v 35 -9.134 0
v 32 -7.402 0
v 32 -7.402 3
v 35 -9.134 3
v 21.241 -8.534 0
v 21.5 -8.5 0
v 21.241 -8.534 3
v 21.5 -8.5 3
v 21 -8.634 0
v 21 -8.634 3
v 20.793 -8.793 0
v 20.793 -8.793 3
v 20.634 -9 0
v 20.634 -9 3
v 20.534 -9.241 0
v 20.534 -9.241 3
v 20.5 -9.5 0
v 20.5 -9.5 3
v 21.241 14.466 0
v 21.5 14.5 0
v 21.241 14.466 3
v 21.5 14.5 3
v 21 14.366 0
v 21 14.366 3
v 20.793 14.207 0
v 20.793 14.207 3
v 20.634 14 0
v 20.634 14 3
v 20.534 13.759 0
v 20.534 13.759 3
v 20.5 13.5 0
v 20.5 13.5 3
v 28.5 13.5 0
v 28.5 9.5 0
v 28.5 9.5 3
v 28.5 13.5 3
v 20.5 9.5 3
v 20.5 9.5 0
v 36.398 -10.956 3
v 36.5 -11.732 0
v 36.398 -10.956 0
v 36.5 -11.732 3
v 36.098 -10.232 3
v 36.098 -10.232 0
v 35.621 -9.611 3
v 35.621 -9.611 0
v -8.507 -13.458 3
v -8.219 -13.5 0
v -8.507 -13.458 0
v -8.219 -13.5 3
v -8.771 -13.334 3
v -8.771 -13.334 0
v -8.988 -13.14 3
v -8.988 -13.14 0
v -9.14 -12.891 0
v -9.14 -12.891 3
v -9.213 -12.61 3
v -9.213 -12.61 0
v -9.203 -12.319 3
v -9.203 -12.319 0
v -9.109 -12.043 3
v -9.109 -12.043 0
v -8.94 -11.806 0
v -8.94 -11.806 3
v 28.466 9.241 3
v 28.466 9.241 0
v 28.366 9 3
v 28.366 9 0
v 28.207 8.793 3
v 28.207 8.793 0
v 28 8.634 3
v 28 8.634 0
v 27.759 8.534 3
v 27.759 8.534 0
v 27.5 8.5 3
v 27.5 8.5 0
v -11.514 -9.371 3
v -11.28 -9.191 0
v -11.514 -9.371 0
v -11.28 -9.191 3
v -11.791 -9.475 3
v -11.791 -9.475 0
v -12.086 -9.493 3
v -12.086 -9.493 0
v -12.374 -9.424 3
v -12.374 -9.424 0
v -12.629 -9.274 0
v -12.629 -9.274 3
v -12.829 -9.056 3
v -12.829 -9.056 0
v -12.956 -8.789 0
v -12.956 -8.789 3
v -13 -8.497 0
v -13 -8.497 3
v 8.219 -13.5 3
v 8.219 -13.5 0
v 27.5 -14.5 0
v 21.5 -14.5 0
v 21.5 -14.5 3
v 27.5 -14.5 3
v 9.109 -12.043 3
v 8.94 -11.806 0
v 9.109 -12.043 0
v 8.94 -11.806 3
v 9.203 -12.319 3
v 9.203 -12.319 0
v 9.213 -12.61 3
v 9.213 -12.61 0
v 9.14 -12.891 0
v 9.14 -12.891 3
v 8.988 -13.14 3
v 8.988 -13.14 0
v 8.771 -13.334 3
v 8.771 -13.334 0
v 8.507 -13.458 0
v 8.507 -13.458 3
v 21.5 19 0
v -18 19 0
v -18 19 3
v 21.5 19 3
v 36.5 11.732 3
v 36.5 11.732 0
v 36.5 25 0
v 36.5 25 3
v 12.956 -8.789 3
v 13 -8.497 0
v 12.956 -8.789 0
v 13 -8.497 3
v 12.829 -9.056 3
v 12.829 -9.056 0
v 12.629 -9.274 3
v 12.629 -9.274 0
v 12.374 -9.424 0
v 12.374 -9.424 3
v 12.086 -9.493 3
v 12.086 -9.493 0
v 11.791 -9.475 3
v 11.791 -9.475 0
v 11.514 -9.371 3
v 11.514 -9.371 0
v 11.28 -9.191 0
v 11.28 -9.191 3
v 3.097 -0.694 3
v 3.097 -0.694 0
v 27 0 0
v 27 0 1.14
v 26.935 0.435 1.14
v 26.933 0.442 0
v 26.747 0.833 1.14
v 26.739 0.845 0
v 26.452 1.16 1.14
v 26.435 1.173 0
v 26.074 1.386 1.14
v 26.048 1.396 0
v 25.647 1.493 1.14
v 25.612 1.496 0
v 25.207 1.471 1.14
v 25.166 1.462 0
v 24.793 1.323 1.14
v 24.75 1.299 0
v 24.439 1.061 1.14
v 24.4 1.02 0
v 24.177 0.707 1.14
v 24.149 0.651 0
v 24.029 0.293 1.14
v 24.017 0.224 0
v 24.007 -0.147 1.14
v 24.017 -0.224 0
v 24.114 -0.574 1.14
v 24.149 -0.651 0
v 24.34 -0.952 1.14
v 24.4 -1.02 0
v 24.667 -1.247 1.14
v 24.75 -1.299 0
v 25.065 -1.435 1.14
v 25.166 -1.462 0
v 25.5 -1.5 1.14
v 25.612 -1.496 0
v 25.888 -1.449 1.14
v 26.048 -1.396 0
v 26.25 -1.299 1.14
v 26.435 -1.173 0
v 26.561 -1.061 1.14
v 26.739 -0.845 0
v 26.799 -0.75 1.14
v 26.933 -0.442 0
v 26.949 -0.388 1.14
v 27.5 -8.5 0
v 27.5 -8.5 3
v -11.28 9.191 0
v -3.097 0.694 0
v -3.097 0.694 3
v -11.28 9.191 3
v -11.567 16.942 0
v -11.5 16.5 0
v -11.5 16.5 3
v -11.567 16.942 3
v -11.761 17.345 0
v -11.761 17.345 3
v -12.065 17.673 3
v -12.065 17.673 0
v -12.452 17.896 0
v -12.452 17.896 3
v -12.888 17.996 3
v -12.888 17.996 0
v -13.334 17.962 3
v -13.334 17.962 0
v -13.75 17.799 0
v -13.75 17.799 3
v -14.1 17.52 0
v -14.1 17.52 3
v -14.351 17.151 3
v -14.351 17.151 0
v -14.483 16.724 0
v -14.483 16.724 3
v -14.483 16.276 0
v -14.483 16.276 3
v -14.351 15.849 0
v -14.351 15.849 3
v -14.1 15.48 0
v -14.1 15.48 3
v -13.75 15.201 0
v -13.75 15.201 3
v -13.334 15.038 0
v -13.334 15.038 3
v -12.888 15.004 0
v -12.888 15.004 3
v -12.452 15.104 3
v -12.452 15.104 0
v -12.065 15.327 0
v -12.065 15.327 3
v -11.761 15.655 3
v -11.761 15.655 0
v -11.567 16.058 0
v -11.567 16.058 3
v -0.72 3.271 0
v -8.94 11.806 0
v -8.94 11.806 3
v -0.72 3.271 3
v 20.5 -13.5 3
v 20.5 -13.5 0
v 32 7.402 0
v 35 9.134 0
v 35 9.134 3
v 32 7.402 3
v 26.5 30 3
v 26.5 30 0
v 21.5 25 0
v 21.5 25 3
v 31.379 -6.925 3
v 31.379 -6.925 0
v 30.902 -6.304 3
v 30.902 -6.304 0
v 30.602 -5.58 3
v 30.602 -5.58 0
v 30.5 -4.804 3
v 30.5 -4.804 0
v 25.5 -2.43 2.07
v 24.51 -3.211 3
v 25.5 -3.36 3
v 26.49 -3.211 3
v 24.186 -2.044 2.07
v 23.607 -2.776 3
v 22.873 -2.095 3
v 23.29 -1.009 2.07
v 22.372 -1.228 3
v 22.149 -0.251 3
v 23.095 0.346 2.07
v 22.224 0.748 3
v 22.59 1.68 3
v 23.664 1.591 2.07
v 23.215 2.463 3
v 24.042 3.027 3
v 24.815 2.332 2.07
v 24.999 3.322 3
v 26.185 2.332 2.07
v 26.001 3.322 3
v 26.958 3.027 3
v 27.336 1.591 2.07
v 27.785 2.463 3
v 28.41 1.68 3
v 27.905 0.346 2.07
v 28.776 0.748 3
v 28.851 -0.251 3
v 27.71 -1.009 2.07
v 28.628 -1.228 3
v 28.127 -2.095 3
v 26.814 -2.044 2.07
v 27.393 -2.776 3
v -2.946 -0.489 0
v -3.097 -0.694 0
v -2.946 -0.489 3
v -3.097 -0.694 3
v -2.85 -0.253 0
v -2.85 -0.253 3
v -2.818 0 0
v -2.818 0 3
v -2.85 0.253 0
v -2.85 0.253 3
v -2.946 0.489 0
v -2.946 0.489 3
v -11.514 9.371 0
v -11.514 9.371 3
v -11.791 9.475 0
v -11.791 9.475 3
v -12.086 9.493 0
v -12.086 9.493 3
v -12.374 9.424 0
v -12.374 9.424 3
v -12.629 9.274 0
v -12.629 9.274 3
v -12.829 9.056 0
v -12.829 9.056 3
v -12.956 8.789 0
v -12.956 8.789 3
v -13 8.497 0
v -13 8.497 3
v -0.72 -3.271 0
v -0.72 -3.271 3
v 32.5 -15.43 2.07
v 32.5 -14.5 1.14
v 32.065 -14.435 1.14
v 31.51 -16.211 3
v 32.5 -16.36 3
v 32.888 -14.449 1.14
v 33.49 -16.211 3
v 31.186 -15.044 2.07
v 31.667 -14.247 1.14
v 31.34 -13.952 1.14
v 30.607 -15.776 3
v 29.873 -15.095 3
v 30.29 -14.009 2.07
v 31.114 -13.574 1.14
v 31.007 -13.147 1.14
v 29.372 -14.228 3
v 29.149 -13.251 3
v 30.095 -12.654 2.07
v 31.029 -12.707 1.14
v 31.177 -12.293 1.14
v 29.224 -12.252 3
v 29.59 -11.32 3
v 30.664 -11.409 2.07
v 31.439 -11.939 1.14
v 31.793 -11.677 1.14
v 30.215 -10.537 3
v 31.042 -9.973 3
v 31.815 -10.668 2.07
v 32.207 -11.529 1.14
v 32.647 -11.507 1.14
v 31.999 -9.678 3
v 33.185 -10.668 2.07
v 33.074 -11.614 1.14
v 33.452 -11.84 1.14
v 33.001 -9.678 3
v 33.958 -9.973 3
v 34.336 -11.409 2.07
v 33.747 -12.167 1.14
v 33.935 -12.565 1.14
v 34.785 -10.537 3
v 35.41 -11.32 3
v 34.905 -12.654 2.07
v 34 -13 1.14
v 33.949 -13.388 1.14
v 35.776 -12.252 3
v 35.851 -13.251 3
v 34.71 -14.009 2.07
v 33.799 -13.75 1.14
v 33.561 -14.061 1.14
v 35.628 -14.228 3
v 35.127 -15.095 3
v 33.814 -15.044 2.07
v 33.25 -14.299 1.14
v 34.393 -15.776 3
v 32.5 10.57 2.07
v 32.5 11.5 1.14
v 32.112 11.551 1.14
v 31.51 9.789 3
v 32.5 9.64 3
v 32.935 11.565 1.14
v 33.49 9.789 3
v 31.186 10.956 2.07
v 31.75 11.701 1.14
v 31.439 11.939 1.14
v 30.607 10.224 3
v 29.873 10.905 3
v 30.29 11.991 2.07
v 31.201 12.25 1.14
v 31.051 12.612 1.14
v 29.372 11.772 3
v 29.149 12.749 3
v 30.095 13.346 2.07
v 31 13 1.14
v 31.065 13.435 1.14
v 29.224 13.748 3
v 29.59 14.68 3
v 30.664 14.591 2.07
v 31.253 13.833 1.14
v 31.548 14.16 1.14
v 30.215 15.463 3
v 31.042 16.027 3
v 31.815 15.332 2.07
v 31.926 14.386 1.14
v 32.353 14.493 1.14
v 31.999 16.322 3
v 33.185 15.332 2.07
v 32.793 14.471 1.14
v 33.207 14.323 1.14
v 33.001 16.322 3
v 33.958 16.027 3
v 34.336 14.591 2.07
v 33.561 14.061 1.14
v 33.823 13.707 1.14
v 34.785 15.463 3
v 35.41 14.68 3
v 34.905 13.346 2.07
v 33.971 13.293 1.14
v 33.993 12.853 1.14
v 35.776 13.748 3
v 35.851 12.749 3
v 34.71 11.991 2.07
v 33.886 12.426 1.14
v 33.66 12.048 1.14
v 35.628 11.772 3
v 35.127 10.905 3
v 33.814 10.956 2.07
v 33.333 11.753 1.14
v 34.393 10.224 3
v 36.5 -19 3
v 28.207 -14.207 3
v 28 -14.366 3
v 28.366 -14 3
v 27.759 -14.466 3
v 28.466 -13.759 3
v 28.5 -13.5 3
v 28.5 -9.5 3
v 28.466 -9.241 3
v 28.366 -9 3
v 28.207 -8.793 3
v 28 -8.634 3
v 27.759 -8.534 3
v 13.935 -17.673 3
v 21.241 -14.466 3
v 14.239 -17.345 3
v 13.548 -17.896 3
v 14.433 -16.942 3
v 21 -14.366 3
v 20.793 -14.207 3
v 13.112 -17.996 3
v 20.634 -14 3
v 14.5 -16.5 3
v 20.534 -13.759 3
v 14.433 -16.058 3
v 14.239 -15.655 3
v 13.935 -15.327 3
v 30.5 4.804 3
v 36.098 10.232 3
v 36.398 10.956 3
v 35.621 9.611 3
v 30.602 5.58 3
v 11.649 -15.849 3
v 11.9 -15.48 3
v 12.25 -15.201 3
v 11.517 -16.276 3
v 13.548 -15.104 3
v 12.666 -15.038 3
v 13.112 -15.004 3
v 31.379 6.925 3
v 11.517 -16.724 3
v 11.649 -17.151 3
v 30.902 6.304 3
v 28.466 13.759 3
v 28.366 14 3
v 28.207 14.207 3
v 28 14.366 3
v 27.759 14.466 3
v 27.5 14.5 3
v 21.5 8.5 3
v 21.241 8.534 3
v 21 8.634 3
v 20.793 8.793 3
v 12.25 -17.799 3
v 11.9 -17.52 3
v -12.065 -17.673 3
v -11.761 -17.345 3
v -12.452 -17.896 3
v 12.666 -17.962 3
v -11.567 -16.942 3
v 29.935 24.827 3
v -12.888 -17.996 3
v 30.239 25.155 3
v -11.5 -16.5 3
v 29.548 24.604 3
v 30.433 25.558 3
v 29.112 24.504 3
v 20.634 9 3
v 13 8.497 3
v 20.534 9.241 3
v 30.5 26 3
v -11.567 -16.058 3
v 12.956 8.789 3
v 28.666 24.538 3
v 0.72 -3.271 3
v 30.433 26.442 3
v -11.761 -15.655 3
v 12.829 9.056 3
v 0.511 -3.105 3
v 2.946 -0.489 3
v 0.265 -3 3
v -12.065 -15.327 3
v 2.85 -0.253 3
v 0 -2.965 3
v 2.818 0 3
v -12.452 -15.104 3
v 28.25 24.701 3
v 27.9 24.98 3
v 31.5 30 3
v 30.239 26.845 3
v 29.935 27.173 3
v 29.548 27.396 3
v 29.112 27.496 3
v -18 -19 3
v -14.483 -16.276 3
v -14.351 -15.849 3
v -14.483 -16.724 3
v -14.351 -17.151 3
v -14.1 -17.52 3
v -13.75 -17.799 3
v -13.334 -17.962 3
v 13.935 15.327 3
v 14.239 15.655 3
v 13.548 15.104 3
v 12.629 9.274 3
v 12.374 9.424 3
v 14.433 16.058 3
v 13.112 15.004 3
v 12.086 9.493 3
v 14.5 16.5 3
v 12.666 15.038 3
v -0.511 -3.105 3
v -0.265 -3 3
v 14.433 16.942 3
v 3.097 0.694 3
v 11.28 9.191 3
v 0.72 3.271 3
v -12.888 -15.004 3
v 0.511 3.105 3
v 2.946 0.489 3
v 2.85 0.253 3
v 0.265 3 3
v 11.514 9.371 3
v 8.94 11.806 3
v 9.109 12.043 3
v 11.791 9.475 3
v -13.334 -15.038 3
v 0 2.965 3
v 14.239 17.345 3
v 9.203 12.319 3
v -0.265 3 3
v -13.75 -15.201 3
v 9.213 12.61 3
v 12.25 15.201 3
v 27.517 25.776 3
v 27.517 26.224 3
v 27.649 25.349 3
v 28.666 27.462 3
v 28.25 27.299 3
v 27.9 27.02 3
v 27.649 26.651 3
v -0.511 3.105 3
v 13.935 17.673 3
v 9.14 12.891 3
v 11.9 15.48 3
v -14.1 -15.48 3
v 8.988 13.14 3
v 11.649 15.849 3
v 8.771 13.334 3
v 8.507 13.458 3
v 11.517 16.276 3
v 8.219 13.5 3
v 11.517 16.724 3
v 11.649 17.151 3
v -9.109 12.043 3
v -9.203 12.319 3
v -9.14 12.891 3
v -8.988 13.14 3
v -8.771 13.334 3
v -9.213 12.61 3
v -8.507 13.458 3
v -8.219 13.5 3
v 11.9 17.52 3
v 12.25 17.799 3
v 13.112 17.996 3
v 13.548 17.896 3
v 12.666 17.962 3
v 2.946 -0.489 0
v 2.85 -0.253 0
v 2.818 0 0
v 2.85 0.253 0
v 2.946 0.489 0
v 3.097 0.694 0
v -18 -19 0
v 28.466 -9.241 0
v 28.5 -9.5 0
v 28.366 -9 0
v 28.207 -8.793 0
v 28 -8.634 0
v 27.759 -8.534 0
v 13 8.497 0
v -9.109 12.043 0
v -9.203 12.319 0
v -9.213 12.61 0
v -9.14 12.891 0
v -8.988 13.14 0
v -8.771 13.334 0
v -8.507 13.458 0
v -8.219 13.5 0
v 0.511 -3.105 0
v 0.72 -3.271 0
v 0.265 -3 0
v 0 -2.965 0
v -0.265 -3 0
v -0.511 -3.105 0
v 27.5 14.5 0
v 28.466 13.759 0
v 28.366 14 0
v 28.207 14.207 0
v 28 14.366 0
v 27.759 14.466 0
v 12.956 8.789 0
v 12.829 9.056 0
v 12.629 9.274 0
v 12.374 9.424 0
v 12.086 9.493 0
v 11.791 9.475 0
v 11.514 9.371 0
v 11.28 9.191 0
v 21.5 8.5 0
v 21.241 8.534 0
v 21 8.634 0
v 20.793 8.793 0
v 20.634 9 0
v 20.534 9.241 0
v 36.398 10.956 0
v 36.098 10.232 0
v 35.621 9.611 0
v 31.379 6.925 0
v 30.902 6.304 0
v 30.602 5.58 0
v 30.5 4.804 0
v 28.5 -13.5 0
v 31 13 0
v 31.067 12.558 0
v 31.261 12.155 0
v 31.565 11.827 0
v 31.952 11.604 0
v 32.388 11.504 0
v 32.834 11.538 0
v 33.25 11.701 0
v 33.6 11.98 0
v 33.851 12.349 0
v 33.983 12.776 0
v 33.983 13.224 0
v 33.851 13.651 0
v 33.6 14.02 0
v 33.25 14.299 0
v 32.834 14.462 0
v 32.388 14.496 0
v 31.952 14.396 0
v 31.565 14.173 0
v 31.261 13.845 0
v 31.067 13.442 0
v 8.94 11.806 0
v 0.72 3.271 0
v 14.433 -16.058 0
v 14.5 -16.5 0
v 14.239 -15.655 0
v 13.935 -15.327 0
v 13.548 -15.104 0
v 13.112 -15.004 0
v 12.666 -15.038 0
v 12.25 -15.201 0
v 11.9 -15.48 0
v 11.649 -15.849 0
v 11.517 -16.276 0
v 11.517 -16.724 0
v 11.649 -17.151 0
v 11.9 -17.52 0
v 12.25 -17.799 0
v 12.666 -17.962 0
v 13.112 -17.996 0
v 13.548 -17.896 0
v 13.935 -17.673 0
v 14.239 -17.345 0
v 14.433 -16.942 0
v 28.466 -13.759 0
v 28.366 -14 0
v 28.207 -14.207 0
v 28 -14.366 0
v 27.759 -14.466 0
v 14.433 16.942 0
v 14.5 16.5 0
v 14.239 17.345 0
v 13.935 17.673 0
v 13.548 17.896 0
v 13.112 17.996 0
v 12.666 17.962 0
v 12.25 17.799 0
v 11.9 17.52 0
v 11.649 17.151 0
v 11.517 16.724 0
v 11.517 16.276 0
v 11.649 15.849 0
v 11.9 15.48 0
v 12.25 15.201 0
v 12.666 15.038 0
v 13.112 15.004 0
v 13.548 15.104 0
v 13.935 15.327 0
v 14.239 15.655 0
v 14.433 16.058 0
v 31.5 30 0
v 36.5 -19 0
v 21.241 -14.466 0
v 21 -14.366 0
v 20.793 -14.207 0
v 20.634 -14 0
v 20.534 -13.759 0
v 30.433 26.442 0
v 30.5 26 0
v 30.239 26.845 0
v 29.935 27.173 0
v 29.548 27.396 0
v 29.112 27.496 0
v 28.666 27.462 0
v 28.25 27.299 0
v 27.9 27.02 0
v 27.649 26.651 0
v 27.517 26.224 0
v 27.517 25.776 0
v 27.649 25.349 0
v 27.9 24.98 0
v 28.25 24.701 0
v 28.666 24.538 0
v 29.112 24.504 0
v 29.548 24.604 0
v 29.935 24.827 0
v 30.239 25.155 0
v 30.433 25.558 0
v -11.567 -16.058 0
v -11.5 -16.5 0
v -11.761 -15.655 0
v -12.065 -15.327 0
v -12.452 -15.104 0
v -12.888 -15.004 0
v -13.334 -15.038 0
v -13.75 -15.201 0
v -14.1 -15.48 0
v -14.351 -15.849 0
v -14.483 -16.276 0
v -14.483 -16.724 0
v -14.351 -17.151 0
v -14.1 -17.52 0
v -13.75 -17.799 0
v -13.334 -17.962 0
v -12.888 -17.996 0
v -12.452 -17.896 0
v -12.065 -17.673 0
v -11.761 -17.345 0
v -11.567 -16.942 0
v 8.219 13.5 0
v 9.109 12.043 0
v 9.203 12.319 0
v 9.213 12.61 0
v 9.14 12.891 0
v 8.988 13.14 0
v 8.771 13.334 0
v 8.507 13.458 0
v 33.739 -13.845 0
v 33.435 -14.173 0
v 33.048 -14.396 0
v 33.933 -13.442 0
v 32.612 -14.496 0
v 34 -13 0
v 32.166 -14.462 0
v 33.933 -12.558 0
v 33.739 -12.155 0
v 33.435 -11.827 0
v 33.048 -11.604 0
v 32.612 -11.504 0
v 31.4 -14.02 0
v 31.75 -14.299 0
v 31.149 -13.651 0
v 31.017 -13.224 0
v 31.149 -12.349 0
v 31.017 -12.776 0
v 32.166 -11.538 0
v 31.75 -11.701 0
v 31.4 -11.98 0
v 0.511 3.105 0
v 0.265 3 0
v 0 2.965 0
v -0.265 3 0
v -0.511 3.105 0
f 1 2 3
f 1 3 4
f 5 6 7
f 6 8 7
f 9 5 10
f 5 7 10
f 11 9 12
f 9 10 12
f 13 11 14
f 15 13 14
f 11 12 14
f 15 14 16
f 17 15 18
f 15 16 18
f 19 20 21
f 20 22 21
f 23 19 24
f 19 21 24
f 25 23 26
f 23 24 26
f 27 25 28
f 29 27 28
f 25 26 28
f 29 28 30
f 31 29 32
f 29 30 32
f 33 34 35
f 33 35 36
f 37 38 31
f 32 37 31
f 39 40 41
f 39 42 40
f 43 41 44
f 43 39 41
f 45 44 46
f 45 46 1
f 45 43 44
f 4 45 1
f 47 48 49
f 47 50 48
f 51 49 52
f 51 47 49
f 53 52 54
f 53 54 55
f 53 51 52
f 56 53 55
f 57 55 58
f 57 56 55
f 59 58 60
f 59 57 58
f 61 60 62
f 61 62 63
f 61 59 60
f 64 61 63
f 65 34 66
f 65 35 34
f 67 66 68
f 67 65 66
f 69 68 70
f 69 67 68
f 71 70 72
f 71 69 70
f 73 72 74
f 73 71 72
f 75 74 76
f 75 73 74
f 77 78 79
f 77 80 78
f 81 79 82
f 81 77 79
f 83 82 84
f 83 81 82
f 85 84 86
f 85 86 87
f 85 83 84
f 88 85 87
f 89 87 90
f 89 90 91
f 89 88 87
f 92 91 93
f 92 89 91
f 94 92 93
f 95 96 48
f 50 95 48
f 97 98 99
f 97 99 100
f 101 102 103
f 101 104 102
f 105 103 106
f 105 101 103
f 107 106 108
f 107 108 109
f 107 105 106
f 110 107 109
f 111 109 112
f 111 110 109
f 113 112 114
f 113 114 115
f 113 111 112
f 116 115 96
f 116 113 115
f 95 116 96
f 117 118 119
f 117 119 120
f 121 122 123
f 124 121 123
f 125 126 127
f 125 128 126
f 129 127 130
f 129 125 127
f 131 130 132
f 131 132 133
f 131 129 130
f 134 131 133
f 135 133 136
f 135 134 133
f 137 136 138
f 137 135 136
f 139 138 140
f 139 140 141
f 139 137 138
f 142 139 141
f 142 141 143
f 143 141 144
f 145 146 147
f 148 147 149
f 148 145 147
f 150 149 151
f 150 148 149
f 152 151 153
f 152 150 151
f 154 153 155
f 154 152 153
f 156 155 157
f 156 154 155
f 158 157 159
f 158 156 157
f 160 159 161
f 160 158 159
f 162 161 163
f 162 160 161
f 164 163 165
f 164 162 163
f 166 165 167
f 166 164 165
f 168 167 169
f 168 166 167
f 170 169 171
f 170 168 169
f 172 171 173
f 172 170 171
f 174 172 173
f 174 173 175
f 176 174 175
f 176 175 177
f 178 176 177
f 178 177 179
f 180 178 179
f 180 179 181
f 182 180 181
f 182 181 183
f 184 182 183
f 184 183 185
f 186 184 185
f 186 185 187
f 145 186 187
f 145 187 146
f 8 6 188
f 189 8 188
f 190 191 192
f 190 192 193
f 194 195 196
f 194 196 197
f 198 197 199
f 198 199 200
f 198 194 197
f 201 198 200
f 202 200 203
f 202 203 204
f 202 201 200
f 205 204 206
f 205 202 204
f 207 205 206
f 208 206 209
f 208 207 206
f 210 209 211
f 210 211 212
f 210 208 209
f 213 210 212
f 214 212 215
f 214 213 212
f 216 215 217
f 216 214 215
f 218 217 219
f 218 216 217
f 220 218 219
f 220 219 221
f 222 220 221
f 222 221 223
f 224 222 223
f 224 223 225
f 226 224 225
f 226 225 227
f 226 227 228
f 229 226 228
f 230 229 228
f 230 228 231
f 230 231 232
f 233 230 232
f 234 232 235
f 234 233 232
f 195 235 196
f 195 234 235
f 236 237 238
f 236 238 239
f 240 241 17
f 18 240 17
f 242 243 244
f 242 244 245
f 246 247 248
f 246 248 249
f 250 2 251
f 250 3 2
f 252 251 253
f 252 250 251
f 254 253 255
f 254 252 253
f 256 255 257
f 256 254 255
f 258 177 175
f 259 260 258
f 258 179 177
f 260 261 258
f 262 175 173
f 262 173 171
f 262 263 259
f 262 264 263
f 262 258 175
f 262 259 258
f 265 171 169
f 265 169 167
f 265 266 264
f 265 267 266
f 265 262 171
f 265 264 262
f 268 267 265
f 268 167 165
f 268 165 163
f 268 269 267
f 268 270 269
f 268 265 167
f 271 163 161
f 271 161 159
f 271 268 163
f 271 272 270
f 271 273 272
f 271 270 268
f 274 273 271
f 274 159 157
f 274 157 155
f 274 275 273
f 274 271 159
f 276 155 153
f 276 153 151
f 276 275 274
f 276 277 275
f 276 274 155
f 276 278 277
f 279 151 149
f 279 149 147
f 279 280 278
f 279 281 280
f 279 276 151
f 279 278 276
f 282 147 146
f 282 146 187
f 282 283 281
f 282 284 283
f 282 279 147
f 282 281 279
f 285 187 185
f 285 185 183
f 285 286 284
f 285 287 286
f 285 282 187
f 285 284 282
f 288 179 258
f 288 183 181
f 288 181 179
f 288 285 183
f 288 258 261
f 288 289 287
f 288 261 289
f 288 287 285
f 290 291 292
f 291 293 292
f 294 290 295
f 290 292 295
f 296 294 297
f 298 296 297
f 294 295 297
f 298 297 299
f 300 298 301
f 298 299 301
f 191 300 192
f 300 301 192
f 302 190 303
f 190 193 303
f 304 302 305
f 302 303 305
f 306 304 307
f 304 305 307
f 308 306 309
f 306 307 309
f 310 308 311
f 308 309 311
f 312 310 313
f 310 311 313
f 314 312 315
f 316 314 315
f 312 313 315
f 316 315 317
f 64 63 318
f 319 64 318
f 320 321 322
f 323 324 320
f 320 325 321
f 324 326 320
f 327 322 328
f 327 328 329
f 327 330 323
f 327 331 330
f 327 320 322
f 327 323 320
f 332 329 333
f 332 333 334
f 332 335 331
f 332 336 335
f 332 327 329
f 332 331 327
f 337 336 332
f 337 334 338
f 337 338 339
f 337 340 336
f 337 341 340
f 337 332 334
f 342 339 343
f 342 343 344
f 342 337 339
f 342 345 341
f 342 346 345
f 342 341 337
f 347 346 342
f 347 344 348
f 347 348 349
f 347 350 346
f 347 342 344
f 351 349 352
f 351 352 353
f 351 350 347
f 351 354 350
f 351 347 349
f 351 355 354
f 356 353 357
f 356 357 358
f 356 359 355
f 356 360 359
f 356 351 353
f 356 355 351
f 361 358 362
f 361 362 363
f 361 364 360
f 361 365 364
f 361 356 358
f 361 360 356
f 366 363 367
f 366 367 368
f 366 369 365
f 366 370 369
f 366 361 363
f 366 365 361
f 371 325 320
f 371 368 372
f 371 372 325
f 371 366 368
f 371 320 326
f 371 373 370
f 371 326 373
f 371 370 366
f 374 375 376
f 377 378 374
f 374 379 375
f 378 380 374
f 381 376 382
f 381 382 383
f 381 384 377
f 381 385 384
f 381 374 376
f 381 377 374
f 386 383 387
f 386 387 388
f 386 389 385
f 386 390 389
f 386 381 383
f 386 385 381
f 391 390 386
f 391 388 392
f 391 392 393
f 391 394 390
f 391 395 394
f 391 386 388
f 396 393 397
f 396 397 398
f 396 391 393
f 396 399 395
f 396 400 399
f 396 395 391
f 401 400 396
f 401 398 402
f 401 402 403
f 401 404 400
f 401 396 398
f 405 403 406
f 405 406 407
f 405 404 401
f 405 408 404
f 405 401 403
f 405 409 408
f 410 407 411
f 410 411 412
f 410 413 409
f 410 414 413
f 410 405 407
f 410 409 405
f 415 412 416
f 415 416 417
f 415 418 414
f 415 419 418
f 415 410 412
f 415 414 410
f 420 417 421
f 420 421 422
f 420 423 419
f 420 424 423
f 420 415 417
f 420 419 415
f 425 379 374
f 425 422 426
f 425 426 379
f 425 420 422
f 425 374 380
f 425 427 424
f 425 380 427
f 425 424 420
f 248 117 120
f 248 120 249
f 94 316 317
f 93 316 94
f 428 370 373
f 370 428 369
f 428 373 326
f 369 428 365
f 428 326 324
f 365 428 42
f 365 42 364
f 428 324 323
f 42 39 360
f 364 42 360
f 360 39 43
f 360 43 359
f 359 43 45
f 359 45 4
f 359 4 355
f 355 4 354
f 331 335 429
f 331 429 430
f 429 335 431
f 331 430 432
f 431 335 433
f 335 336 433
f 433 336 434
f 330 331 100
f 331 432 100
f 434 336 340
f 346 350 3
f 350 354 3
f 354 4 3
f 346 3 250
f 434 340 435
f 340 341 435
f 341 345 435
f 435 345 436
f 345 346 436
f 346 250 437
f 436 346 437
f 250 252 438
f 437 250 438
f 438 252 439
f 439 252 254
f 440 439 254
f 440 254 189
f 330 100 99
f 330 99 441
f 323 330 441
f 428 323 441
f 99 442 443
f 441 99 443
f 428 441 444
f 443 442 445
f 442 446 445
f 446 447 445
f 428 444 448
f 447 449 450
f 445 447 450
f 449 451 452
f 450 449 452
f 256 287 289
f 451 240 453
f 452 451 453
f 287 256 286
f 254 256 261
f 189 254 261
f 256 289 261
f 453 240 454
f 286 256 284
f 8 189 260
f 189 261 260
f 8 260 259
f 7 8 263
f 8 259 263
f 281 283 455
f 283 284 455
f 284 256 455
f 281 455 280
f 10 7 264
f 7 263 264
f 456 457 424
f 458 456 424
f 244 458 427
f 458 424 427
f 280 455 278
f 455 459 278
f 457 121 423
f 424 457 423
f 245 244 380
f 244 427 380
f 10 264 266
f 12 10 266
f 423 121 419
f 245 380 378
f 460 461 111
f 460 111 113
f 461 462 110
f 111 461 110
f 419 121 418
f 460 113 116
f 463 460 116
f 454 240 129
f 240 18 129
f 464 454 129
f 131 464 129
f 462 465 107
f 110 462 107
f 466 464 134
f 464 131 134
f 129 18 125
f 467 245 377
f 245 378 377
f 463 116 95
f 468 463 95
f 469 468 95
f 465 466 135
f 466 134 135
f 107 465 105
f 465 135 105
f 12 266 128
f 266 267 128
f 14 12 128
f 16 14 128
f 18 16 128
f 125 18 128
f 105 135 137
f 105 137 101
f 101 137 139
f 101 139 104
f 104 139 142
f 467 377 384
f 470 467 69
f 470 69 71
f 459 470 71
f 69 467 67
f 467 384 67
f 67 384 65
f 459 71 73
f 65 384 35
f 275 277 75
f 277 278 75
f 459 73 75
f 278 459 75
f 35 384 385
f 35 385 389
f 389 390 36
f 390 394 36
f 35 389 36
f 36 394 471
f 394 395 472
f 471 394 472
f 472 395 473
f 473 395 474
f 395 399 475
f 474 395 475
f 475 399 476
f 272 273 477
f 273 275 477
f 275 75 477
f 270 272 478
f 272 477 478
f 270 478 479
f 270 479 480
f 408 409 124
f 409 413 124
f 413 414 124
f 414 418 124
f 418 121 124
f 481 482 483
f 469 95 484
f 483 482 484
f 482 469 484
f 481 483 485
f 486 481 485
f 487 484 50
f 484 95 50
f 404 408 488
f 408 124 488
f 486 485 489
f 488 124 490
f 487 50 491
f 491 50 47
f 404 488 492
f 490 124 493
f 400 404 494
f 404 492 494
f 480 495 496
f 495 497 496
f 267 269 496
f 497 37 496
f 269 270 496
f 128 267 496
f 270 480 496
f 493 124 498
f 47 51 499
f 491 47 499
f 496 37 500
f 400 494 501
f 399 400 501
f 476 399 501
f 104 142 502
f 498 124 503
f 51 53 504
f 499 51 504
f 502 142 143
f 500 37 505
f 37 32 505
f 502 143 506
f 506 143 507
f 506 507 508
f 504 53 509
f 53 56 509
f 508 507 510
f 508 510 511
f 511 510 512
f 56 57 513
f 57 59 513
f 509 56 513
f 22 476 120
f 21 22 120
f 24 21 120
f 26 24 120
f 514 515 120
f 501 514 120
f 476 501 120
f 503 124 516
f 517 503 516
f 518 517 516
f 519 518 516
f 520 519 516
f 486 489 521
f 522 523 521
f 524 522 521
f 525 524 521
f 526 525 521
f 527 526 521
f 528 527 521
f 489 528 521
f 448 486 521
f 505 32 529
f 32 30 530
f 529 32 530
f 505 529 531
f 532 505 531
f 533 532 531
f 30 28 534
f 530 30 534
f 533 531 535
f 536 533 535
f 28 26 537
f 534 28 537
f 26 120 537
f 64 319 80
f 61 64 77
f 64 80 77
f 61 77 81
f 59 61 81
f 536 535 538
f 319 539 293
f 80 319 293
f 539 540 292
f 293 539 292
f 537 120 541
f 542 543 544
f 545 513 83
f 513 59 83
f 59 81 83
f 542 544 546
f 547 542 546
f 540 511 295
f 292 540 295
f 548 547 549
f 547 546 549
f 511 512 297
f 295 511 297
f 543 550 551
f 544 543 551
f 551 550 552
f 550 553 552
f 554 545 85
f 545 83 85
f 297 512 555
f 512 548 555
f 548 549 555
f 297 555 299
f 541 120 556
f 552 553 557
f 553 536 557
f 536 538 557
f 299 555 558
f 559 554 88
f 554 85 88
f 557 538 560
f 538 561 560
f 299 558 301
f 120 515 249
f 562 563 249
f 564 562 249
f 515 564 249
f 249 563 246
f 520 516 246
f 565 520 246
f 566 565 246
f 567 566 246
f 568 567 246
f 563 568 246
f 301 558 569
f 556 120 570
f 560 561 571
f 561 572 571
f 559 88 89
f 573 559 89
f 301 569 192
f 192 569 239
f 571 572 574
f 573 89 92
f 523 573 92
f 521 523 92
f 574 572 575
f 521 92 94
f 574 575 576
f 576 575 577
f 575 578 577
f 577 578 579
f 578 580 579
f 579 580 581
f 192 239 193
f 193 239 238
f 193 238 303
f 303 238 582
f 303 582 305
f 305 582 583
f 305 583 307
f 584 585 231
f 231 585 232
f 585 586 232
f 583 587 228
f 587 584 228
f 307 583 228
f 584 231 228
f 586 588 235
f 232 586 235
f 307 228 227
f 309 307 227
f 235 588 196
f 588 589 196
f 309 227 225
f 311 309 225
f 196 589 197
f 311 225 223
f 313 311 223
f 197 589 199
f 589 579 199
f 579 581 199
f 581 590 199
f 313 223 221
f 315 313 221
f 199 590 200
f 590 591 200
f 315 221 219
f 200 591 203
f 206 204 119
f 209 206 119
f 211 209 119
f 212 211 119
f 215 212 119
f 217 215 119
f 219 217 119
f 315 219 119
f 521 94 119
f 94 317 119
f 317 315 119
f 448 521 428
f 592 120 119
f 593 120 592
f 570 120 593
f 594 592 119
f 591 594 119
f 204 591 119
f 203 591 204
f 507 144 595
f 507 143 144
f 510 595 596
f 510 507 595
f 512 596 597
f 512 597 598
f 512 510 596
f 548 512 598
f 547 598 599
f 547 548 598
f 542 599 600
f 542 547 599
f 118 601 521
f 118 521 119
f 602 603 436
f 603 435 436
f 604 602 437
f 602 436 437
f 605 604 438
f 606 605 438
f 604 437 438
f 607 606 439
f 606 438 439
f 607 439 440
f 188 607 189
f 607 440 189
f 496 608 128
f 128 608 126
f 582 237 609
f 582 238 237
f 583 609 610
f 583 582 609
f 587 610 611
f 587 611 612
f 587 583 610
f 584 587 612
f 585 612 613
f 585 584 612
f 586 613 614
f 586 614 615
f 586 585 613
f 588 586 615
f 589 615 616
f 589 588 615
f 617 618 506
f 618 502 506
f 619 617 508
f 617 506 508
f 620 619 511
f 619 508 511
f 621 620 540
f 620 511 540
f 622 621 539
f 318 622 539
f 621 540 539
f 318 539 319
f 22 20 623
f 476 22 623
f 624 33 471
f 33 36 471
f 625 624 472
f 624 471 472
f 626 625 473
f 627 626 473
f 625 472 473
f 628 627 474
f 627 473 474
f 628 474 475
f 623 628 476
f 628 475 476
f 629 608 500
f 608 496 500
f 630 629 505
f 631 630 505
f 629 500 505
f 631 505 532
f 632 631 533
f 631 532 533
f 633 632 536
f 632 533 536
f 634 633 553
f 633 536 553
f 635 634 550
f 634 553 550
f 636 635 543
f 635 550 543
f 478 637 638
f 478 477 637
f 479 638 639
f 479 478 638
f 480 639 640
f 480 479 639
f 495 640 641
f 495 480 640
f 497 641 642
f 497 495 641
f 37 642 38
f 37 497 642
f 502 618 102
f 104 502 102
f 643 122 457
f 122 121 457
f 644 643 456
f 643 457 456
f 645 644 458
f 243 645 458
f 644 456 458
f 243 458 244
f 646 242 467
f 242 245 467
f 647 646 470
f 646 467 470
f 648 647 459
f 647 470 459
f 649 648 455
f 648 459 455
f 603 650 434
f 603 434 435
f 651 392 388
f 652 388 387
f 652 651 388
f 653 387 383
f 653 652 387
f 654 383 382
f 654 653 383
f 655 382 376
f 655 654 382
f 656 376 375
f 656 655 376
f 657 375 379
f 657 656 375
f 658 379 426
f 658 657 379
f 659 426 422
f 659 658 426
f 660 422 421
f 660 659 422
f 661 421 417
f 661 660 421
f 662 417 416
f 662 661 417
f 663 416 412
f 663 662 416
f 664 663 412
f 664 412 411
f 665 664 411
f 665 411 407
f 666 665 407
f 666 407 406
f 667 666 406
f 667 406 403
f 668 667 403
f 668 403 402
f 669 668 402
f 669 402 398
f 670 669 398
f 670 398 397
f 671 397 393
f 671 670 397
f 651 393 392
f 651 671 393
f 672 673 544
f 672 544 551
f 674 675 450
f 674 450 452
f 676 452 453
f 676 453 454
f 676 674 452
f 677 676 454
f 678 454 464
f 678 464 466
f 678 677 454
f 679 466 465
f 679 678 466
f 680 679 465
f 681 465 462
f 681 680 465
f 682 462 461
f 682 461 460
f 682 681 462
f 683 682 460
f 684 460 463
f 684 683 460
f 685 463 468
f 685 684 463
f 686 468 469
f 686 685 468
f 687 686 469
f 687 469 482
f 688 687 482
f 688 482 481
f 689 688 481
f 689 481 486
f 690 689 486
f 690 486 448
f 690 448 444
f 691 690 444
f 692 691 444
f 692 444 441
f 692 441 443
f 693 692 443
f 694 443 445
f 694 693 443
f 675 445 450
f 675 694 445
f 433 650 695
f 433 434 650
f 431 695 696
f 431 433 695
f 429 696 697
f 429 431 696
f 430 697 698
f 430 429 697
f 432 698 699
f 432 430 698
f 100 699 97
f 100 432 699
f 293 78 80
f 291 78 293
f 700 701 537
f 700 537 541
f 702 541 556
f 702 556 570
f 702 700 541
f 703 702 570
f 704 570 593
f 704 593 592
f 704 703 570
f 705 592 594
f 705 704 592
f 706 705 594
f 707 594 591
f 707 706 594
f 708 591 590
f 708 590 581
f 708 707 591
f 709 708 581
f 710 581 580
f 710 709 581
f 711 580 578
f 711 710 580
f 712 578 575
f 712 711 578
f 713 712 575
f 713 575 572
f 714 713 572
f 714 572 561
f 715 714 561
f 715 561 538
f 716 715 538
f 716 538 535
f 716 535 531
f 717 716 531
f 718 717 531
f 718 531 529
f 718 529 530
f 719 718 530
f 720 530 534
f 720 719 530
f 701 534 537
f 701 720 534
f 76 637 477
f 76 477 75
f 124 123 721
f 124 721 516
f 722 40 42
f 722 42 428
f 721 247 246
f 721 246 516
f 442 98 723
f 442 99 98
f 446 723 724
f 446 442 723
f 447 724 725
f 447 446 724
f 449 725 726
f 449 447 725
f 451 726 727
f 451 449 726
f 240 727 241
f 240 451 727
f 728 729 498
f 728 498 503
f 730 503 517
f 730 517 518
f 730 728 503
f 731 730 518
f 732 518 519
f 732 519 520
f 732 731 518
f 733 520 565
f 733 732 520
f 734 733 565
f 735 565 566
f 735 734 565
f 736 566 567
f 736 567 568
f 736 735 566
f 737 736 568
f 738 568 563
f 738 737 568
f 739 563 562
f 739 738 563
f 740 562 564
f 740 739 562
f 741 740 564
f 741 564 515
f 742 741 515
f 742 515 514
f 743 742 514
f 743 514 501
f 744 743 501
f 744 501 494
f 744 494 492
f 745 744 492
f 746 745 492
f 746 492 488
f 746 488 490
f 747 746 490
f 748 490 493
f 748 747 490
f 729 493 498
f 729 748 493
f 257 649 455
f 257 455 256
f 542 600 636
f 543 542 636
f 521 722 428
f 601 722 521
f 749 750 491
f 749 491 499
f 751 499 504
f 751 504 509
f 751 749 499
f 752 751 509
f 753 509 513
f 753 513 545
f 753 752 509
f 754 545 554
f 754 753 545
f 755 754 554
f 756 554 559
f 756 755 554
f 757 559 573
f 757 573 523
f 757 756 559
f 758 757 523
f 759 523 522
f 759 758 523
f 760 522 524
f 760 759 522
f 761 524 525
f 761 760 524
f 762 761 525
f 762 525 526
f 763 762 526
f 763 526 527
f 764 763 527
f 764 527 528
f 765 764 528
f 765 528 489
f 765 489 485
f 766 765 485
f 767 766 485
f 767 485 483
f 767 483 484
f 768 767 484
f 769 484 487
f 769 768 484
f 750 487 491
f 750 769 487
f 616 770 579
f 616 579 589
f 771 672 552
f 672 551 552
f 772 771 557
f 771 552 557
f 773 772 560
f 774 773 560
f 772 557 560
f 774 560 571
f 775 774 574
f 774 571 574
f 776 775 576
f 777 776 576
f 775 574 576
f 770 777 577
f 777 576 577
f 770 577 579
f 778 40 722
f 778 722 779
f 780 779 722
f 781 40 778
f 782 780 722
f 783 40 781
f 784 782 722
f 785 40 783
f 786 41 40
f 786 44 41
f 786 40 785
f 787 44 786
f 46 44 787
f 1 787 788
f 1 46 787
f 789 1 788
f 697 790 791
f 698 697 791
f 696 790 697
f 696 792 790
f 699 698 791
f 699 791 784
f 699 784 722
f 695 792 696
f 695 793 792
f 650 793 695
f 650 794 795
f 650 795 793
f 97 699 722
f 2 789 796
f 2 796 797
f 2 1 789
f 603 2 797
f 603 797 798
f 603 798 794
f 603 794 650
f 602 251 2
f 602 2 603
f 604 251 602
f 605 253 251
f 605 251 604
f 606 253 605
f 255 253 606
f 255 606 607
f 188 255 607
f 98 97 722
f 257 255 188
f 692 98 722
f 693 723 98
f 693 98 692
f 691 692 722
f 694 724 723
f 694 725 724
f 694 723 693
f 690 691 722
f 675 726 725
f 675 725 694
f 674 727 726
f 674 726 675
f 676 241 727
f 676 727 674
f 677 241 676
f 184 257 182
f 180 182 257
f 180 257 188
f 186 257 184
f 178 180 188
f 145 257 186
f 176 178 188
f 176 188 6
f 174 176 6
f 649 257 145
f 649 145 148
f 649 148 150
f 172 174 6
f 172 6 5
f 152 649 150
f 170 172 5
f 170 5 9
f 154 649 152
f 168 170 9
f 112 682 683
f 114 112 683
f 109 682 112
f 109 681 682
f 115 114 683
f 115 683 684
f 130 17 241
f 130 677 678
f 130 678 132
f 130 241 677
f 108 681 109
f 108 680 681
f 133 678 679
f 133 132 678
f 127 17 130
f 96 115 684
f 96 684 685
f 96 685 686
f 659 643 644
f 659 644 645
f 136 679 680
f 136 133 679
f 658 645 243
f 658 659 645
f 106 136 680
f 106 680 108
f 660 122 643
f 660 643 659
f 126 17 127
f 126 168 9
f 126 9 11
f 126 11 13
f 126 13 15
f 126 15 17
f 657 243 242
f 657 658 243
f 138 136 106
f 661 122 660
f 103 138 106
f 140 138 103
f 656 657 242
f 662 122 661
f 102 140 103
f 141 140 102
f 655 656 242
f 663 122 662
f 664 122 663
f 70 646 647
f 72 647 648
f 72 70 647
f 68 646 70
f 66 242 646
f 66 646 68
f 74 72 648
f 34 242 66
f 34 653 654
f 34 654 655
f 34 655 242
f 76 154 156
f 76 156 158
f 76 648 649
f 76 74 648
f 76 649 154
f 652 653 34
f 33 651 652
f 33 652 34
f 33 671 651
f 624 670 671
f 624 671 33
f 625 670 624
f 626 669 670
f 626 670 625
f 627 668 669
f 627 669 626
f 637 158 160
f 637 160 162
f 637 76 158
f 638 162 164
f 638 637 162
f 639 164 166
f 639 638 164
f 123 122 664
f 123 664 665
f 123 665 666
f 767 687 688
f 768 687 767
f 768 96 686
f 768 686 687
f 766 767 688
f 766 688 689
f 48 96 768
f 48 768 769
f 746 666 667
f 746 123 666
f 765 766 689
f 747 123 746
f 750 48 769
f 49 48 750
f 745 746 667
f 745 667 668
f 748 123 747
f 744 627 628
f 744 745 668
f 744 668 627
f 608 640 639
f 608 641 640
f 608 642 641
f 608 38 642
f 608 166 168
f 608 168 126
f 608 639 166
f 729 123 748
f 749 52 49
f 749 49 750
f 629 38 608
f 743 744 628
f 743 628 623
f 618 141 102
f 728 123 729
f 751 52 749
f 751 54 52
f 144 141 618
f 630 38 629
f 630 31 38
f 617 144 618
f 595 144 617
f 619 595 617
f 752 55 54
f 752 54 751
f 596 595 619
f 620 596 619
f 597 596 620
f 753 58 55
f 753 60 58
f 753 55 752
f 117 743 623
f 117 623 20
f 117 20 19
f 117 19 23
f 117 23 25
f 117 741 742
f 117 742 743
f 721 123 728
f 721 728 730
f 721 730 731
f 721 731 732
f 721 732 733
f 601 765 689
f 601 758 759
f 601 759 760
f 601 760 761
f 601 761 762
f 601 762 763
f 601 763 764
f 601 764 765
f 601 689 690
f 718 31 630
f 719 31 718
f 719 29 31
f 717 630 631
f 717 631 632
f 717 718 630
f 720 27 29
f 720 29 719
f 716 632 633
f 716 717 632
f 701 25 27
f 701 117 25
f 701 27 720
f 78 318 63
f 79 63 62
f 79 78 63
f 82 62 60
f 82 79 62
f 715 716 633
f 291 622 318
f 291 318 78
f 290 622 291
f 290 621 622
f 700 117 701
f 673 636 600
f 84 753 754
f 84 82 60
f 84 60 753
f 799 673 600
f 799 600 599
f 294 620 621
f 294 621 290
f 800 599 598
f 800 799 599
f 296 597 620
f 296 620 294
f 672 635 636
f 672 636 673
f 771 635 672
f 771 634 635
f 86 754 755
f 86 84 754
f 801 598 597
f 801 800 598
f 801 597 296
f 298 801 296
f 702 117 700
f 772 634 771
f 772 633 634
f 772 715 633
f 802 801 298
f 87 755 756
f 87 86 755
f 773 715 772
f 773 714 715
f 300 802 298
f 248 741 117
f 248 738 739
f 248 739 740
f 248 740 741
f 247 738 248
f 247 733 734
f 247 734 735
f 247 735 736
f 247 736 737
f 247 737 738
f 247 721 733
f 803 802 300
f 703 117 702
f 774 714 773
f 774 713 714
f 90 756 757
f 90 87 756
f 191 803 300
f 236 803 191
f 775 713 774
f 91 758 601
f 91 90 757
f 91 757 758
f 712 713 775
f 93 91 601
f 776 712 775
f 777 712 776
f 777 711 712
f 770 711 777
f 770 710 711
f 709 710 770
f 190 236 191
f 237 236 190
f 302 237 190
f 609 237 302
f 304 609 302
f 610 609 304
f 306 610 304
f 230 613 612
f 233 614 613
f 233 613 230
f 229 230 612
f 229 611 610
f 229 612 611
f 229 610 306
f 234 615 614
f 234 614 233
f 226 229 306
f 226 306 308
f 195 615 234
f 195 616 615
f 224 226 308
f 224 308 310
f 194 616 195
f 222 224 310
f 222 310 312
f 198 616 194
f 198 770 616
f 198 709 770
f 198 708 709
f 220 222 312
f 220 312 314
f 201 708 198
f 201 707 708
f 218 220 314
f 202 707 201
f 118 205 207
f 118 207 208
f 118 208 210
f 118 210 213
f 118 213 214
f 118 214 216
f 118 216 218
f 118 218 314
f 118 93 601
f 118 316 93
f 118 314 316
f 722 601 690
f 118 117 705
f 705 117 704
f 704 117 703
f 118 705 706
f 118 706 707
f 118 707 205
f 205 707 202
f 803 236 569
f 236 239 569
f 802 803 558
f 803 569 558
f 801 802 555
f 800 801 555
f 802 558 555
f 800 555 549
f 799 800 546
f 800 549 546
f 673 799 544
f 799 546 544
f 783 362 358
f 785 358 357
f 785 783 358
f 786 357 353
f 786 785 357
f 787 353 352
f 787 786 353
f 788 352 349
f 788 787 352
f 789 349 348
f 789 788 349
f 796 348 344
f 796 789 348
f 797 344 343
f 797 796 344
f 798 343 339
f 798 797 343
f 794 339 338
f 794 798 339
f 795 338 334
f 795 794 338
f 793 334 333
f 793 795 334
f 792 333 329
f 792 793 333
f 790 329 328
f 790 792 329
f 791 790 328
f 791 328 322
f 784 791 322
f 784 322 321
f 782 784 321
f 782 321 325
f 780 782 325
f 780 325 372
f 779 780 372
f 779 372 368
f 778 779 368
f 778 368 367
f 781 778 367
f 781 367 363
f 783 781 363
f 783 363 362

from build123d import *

# Parameters (mm, degrees)
SKETCH_1_R                  = 1.5
SKETCH_1_W                  = 8
SKETCH_1_H                  = 6
EXTRUDE_1_DEPTH             = 3
HOLE_WIZARD_M3_1_AT_2_COUNT = 2
HOLE_WIZARD_M3_1_AT_2_PITCH = 14.76482306
HOLE_WIZARD_M3_1_AT_3_COUNT = 2
HOLE_WIZARD_M3_1_AT_3_PITCH = 26
FILLET_1_R                  = 1
CHAMFER_1_SIZE              = 5
FILLET_2_R                  = 3


with BuildPart() as part:
    # 草图1 → 凸台-拉伸1 (new body)
    with BuildSketch(Plane.XY):
        Polygon((36.5, -19), (-18, -19), (-18, 19), (21.5, 19), (21.5, 30), (36.5, 30), (36.5, 19), (36.5, 10), (30.5, 6.535898385), (30.5, -6.535898385), (36.5, -10), align=None)
        with Locations((-13, 16.5)):
            Circle(SKETCH_1_R, mode=Mode.SUBTRACT)
        with Locations((-13, -16.5)):
            Circle(SKETCH_1_R, mode=Mode.SUBTRACT)
        with Locations((13, -16.5)):
            Circle(SKETCH_1_R, mode=Mode.SUBTRACT)
        with Locations((13, 16.5)):
            Circle(SKETCH_1_R, mode=Mode.SUBTRACT)
        with Locations((32.5, -13)):
            Circle(SKETCH_1_R, mode=Mode.SUBTRACT)
        with Locations(Location((32.5, 13, 0), (0, 0, 180))):
            Circle(SKETCH_1_R, mode=Mode.SUBTRACT)
        with Locations((25.5, 0)):
            Circle(SKETCH_1_R, mode=Mode.SUBTRACT)
        with Locations((29, 26)):
            Circle(SKETCH_1_R, mode=Mode.SUBTRACT)
        with Locations((24.5, -11.5)):
            Rectangle(SKETCH_1_W, SKETCH_1_H, mode=Mode.SUBTRACT)
        with Locations((24.5, 11.5)):
            Rectangle(SKETCH_1_W, SKETCH_1_H, mode=Mode.SUBTRACT)
        Polygon((-13, -10.977083583), (-2.429475068, 0), (-13, 10.977083583), align=None, mode=Mode.SUBTRACT)
        Polygon((-10.570524932, -13.5), (0, -2.522916417), (10.570524932, -13.5), align=None, mode=Mode.SUBTRACT)
        Polygon((-10.570524932, 13.5), (0, 2.522916417), (10.570524932, 13.5), align=None, mode=Mode.SUBTRACT)
        Polygon((2.429475068, 0), (13, 10.977083583), (13, -10.977083583), align=None, mode=Mode.SUBTRACT)
    extrude(amount=EXTRUDE_1_DEPTH)

    # 草图2 → M3 六角凹锥坑螺钉的锥形沉头孔1 (revolve, cut)
    with BuildSketch(Plane(origin=(32.5, 13, 3), x_dir=(0, -1, 0), z_dir=(1, 0, 0))):
        Polygon((0, 0), (0, 3), (1.5, 3), (1.5, 1.86), (3.36, 0), align=None)
    hole_wizard_m3_1 = revolve(axis=Axis((32.5, 13, 9.35), (0, 0, -1)), mode=Mode.SUBTRACT)

    # M3 六角凹锥坑螺钉的锥形沉头孔1 at 2: M3 六角凹锥坑螺钉的锥形沉头孔1 ×2
    with Locations(*[Vector(-0.4740998230350173, -0.8804710999221754, 0) * (i * HOLE_WIZARD_M3_1_AT_2_PITCH) for i in range(1, HOLE_WIZARD_M3_1_AT_2_COUNT)]):
        add(hole_wizard_m3_1, mode=Mode.SUBTRACT)

    # M3 六角凹锥坑螺钉的锥形沉头孔1 at 3: M3 六角凹锥坑螺钉的锥形沉头孔1 ×2
    with Locations(*[(0, -i * HOLE_WIZARD_M3_1_AT_3_PITCH, 0) for i in range(1, HOLE_WIZARD_M3_1_AT_3_COUNT)]):
        add(hole_wizard_m3_1, mode=Mode.SUBTRACT)

    # 圆角1
    fillet_1_edges = [part.edges().sort_by_distance(p)[0] for p in [
        (-10.570524932, -13.5, 1.5),
        (10.570524932, -13.5, 1.5),
        (0, -2.522916417, 1.5),
        (13, -10.977083583, 1.5),
        (13, 10.977083583, 1.5),
        (2.429475068, 0, 1.5),
        (28.5, -8.5, 1.5),
        (20.5, -8.5, 1.5),
        (20.5, -14.5, 1.5),
        (28.5, -14.5, 1.5),
        (20.5, 14.5, 1.5),
        (20.5, 8.5, 1.5),
        (28.5, 8.5, 1.5),
        (28.5, 14.5, 1.5),
        (-13, 10.977083583, 1.5),
        (-13, -10.977083583, 1.5),
        (-2.429475068, 0, 1.5),
        (10.570524932, 13.5, 1.5),
        (-10.570524932, 13.5, 1.5),
        (0, 2.522916417, 1.5),
    ]]
    fillet(fillet_1_edges, radius=FILLET_1_R)

    # 倒角1
    chamfer_1_edges = [part.edges().sort_by_distance(p)[0] for p in [
        (21.5, 30, 1.5),
        (36.5, 30, 1.5),
    ]]
    chamfer(chamfer_1_edges, length=CHAMFER_1_SIZE)

    # 圆角2
    fillet_2_edges = [part.edges().sort_by_distance(p)[0] for p in [
        (36.5, 10, 1.5),
        (30.5, 6.535898385, 1.5),
        (30.5, -6.535898385, 1.5),
        (36.5, -10, 1.5),
    ]]
    fillet(fillet_2_edges, radius=FILLET_2_R)


solid = part.part
